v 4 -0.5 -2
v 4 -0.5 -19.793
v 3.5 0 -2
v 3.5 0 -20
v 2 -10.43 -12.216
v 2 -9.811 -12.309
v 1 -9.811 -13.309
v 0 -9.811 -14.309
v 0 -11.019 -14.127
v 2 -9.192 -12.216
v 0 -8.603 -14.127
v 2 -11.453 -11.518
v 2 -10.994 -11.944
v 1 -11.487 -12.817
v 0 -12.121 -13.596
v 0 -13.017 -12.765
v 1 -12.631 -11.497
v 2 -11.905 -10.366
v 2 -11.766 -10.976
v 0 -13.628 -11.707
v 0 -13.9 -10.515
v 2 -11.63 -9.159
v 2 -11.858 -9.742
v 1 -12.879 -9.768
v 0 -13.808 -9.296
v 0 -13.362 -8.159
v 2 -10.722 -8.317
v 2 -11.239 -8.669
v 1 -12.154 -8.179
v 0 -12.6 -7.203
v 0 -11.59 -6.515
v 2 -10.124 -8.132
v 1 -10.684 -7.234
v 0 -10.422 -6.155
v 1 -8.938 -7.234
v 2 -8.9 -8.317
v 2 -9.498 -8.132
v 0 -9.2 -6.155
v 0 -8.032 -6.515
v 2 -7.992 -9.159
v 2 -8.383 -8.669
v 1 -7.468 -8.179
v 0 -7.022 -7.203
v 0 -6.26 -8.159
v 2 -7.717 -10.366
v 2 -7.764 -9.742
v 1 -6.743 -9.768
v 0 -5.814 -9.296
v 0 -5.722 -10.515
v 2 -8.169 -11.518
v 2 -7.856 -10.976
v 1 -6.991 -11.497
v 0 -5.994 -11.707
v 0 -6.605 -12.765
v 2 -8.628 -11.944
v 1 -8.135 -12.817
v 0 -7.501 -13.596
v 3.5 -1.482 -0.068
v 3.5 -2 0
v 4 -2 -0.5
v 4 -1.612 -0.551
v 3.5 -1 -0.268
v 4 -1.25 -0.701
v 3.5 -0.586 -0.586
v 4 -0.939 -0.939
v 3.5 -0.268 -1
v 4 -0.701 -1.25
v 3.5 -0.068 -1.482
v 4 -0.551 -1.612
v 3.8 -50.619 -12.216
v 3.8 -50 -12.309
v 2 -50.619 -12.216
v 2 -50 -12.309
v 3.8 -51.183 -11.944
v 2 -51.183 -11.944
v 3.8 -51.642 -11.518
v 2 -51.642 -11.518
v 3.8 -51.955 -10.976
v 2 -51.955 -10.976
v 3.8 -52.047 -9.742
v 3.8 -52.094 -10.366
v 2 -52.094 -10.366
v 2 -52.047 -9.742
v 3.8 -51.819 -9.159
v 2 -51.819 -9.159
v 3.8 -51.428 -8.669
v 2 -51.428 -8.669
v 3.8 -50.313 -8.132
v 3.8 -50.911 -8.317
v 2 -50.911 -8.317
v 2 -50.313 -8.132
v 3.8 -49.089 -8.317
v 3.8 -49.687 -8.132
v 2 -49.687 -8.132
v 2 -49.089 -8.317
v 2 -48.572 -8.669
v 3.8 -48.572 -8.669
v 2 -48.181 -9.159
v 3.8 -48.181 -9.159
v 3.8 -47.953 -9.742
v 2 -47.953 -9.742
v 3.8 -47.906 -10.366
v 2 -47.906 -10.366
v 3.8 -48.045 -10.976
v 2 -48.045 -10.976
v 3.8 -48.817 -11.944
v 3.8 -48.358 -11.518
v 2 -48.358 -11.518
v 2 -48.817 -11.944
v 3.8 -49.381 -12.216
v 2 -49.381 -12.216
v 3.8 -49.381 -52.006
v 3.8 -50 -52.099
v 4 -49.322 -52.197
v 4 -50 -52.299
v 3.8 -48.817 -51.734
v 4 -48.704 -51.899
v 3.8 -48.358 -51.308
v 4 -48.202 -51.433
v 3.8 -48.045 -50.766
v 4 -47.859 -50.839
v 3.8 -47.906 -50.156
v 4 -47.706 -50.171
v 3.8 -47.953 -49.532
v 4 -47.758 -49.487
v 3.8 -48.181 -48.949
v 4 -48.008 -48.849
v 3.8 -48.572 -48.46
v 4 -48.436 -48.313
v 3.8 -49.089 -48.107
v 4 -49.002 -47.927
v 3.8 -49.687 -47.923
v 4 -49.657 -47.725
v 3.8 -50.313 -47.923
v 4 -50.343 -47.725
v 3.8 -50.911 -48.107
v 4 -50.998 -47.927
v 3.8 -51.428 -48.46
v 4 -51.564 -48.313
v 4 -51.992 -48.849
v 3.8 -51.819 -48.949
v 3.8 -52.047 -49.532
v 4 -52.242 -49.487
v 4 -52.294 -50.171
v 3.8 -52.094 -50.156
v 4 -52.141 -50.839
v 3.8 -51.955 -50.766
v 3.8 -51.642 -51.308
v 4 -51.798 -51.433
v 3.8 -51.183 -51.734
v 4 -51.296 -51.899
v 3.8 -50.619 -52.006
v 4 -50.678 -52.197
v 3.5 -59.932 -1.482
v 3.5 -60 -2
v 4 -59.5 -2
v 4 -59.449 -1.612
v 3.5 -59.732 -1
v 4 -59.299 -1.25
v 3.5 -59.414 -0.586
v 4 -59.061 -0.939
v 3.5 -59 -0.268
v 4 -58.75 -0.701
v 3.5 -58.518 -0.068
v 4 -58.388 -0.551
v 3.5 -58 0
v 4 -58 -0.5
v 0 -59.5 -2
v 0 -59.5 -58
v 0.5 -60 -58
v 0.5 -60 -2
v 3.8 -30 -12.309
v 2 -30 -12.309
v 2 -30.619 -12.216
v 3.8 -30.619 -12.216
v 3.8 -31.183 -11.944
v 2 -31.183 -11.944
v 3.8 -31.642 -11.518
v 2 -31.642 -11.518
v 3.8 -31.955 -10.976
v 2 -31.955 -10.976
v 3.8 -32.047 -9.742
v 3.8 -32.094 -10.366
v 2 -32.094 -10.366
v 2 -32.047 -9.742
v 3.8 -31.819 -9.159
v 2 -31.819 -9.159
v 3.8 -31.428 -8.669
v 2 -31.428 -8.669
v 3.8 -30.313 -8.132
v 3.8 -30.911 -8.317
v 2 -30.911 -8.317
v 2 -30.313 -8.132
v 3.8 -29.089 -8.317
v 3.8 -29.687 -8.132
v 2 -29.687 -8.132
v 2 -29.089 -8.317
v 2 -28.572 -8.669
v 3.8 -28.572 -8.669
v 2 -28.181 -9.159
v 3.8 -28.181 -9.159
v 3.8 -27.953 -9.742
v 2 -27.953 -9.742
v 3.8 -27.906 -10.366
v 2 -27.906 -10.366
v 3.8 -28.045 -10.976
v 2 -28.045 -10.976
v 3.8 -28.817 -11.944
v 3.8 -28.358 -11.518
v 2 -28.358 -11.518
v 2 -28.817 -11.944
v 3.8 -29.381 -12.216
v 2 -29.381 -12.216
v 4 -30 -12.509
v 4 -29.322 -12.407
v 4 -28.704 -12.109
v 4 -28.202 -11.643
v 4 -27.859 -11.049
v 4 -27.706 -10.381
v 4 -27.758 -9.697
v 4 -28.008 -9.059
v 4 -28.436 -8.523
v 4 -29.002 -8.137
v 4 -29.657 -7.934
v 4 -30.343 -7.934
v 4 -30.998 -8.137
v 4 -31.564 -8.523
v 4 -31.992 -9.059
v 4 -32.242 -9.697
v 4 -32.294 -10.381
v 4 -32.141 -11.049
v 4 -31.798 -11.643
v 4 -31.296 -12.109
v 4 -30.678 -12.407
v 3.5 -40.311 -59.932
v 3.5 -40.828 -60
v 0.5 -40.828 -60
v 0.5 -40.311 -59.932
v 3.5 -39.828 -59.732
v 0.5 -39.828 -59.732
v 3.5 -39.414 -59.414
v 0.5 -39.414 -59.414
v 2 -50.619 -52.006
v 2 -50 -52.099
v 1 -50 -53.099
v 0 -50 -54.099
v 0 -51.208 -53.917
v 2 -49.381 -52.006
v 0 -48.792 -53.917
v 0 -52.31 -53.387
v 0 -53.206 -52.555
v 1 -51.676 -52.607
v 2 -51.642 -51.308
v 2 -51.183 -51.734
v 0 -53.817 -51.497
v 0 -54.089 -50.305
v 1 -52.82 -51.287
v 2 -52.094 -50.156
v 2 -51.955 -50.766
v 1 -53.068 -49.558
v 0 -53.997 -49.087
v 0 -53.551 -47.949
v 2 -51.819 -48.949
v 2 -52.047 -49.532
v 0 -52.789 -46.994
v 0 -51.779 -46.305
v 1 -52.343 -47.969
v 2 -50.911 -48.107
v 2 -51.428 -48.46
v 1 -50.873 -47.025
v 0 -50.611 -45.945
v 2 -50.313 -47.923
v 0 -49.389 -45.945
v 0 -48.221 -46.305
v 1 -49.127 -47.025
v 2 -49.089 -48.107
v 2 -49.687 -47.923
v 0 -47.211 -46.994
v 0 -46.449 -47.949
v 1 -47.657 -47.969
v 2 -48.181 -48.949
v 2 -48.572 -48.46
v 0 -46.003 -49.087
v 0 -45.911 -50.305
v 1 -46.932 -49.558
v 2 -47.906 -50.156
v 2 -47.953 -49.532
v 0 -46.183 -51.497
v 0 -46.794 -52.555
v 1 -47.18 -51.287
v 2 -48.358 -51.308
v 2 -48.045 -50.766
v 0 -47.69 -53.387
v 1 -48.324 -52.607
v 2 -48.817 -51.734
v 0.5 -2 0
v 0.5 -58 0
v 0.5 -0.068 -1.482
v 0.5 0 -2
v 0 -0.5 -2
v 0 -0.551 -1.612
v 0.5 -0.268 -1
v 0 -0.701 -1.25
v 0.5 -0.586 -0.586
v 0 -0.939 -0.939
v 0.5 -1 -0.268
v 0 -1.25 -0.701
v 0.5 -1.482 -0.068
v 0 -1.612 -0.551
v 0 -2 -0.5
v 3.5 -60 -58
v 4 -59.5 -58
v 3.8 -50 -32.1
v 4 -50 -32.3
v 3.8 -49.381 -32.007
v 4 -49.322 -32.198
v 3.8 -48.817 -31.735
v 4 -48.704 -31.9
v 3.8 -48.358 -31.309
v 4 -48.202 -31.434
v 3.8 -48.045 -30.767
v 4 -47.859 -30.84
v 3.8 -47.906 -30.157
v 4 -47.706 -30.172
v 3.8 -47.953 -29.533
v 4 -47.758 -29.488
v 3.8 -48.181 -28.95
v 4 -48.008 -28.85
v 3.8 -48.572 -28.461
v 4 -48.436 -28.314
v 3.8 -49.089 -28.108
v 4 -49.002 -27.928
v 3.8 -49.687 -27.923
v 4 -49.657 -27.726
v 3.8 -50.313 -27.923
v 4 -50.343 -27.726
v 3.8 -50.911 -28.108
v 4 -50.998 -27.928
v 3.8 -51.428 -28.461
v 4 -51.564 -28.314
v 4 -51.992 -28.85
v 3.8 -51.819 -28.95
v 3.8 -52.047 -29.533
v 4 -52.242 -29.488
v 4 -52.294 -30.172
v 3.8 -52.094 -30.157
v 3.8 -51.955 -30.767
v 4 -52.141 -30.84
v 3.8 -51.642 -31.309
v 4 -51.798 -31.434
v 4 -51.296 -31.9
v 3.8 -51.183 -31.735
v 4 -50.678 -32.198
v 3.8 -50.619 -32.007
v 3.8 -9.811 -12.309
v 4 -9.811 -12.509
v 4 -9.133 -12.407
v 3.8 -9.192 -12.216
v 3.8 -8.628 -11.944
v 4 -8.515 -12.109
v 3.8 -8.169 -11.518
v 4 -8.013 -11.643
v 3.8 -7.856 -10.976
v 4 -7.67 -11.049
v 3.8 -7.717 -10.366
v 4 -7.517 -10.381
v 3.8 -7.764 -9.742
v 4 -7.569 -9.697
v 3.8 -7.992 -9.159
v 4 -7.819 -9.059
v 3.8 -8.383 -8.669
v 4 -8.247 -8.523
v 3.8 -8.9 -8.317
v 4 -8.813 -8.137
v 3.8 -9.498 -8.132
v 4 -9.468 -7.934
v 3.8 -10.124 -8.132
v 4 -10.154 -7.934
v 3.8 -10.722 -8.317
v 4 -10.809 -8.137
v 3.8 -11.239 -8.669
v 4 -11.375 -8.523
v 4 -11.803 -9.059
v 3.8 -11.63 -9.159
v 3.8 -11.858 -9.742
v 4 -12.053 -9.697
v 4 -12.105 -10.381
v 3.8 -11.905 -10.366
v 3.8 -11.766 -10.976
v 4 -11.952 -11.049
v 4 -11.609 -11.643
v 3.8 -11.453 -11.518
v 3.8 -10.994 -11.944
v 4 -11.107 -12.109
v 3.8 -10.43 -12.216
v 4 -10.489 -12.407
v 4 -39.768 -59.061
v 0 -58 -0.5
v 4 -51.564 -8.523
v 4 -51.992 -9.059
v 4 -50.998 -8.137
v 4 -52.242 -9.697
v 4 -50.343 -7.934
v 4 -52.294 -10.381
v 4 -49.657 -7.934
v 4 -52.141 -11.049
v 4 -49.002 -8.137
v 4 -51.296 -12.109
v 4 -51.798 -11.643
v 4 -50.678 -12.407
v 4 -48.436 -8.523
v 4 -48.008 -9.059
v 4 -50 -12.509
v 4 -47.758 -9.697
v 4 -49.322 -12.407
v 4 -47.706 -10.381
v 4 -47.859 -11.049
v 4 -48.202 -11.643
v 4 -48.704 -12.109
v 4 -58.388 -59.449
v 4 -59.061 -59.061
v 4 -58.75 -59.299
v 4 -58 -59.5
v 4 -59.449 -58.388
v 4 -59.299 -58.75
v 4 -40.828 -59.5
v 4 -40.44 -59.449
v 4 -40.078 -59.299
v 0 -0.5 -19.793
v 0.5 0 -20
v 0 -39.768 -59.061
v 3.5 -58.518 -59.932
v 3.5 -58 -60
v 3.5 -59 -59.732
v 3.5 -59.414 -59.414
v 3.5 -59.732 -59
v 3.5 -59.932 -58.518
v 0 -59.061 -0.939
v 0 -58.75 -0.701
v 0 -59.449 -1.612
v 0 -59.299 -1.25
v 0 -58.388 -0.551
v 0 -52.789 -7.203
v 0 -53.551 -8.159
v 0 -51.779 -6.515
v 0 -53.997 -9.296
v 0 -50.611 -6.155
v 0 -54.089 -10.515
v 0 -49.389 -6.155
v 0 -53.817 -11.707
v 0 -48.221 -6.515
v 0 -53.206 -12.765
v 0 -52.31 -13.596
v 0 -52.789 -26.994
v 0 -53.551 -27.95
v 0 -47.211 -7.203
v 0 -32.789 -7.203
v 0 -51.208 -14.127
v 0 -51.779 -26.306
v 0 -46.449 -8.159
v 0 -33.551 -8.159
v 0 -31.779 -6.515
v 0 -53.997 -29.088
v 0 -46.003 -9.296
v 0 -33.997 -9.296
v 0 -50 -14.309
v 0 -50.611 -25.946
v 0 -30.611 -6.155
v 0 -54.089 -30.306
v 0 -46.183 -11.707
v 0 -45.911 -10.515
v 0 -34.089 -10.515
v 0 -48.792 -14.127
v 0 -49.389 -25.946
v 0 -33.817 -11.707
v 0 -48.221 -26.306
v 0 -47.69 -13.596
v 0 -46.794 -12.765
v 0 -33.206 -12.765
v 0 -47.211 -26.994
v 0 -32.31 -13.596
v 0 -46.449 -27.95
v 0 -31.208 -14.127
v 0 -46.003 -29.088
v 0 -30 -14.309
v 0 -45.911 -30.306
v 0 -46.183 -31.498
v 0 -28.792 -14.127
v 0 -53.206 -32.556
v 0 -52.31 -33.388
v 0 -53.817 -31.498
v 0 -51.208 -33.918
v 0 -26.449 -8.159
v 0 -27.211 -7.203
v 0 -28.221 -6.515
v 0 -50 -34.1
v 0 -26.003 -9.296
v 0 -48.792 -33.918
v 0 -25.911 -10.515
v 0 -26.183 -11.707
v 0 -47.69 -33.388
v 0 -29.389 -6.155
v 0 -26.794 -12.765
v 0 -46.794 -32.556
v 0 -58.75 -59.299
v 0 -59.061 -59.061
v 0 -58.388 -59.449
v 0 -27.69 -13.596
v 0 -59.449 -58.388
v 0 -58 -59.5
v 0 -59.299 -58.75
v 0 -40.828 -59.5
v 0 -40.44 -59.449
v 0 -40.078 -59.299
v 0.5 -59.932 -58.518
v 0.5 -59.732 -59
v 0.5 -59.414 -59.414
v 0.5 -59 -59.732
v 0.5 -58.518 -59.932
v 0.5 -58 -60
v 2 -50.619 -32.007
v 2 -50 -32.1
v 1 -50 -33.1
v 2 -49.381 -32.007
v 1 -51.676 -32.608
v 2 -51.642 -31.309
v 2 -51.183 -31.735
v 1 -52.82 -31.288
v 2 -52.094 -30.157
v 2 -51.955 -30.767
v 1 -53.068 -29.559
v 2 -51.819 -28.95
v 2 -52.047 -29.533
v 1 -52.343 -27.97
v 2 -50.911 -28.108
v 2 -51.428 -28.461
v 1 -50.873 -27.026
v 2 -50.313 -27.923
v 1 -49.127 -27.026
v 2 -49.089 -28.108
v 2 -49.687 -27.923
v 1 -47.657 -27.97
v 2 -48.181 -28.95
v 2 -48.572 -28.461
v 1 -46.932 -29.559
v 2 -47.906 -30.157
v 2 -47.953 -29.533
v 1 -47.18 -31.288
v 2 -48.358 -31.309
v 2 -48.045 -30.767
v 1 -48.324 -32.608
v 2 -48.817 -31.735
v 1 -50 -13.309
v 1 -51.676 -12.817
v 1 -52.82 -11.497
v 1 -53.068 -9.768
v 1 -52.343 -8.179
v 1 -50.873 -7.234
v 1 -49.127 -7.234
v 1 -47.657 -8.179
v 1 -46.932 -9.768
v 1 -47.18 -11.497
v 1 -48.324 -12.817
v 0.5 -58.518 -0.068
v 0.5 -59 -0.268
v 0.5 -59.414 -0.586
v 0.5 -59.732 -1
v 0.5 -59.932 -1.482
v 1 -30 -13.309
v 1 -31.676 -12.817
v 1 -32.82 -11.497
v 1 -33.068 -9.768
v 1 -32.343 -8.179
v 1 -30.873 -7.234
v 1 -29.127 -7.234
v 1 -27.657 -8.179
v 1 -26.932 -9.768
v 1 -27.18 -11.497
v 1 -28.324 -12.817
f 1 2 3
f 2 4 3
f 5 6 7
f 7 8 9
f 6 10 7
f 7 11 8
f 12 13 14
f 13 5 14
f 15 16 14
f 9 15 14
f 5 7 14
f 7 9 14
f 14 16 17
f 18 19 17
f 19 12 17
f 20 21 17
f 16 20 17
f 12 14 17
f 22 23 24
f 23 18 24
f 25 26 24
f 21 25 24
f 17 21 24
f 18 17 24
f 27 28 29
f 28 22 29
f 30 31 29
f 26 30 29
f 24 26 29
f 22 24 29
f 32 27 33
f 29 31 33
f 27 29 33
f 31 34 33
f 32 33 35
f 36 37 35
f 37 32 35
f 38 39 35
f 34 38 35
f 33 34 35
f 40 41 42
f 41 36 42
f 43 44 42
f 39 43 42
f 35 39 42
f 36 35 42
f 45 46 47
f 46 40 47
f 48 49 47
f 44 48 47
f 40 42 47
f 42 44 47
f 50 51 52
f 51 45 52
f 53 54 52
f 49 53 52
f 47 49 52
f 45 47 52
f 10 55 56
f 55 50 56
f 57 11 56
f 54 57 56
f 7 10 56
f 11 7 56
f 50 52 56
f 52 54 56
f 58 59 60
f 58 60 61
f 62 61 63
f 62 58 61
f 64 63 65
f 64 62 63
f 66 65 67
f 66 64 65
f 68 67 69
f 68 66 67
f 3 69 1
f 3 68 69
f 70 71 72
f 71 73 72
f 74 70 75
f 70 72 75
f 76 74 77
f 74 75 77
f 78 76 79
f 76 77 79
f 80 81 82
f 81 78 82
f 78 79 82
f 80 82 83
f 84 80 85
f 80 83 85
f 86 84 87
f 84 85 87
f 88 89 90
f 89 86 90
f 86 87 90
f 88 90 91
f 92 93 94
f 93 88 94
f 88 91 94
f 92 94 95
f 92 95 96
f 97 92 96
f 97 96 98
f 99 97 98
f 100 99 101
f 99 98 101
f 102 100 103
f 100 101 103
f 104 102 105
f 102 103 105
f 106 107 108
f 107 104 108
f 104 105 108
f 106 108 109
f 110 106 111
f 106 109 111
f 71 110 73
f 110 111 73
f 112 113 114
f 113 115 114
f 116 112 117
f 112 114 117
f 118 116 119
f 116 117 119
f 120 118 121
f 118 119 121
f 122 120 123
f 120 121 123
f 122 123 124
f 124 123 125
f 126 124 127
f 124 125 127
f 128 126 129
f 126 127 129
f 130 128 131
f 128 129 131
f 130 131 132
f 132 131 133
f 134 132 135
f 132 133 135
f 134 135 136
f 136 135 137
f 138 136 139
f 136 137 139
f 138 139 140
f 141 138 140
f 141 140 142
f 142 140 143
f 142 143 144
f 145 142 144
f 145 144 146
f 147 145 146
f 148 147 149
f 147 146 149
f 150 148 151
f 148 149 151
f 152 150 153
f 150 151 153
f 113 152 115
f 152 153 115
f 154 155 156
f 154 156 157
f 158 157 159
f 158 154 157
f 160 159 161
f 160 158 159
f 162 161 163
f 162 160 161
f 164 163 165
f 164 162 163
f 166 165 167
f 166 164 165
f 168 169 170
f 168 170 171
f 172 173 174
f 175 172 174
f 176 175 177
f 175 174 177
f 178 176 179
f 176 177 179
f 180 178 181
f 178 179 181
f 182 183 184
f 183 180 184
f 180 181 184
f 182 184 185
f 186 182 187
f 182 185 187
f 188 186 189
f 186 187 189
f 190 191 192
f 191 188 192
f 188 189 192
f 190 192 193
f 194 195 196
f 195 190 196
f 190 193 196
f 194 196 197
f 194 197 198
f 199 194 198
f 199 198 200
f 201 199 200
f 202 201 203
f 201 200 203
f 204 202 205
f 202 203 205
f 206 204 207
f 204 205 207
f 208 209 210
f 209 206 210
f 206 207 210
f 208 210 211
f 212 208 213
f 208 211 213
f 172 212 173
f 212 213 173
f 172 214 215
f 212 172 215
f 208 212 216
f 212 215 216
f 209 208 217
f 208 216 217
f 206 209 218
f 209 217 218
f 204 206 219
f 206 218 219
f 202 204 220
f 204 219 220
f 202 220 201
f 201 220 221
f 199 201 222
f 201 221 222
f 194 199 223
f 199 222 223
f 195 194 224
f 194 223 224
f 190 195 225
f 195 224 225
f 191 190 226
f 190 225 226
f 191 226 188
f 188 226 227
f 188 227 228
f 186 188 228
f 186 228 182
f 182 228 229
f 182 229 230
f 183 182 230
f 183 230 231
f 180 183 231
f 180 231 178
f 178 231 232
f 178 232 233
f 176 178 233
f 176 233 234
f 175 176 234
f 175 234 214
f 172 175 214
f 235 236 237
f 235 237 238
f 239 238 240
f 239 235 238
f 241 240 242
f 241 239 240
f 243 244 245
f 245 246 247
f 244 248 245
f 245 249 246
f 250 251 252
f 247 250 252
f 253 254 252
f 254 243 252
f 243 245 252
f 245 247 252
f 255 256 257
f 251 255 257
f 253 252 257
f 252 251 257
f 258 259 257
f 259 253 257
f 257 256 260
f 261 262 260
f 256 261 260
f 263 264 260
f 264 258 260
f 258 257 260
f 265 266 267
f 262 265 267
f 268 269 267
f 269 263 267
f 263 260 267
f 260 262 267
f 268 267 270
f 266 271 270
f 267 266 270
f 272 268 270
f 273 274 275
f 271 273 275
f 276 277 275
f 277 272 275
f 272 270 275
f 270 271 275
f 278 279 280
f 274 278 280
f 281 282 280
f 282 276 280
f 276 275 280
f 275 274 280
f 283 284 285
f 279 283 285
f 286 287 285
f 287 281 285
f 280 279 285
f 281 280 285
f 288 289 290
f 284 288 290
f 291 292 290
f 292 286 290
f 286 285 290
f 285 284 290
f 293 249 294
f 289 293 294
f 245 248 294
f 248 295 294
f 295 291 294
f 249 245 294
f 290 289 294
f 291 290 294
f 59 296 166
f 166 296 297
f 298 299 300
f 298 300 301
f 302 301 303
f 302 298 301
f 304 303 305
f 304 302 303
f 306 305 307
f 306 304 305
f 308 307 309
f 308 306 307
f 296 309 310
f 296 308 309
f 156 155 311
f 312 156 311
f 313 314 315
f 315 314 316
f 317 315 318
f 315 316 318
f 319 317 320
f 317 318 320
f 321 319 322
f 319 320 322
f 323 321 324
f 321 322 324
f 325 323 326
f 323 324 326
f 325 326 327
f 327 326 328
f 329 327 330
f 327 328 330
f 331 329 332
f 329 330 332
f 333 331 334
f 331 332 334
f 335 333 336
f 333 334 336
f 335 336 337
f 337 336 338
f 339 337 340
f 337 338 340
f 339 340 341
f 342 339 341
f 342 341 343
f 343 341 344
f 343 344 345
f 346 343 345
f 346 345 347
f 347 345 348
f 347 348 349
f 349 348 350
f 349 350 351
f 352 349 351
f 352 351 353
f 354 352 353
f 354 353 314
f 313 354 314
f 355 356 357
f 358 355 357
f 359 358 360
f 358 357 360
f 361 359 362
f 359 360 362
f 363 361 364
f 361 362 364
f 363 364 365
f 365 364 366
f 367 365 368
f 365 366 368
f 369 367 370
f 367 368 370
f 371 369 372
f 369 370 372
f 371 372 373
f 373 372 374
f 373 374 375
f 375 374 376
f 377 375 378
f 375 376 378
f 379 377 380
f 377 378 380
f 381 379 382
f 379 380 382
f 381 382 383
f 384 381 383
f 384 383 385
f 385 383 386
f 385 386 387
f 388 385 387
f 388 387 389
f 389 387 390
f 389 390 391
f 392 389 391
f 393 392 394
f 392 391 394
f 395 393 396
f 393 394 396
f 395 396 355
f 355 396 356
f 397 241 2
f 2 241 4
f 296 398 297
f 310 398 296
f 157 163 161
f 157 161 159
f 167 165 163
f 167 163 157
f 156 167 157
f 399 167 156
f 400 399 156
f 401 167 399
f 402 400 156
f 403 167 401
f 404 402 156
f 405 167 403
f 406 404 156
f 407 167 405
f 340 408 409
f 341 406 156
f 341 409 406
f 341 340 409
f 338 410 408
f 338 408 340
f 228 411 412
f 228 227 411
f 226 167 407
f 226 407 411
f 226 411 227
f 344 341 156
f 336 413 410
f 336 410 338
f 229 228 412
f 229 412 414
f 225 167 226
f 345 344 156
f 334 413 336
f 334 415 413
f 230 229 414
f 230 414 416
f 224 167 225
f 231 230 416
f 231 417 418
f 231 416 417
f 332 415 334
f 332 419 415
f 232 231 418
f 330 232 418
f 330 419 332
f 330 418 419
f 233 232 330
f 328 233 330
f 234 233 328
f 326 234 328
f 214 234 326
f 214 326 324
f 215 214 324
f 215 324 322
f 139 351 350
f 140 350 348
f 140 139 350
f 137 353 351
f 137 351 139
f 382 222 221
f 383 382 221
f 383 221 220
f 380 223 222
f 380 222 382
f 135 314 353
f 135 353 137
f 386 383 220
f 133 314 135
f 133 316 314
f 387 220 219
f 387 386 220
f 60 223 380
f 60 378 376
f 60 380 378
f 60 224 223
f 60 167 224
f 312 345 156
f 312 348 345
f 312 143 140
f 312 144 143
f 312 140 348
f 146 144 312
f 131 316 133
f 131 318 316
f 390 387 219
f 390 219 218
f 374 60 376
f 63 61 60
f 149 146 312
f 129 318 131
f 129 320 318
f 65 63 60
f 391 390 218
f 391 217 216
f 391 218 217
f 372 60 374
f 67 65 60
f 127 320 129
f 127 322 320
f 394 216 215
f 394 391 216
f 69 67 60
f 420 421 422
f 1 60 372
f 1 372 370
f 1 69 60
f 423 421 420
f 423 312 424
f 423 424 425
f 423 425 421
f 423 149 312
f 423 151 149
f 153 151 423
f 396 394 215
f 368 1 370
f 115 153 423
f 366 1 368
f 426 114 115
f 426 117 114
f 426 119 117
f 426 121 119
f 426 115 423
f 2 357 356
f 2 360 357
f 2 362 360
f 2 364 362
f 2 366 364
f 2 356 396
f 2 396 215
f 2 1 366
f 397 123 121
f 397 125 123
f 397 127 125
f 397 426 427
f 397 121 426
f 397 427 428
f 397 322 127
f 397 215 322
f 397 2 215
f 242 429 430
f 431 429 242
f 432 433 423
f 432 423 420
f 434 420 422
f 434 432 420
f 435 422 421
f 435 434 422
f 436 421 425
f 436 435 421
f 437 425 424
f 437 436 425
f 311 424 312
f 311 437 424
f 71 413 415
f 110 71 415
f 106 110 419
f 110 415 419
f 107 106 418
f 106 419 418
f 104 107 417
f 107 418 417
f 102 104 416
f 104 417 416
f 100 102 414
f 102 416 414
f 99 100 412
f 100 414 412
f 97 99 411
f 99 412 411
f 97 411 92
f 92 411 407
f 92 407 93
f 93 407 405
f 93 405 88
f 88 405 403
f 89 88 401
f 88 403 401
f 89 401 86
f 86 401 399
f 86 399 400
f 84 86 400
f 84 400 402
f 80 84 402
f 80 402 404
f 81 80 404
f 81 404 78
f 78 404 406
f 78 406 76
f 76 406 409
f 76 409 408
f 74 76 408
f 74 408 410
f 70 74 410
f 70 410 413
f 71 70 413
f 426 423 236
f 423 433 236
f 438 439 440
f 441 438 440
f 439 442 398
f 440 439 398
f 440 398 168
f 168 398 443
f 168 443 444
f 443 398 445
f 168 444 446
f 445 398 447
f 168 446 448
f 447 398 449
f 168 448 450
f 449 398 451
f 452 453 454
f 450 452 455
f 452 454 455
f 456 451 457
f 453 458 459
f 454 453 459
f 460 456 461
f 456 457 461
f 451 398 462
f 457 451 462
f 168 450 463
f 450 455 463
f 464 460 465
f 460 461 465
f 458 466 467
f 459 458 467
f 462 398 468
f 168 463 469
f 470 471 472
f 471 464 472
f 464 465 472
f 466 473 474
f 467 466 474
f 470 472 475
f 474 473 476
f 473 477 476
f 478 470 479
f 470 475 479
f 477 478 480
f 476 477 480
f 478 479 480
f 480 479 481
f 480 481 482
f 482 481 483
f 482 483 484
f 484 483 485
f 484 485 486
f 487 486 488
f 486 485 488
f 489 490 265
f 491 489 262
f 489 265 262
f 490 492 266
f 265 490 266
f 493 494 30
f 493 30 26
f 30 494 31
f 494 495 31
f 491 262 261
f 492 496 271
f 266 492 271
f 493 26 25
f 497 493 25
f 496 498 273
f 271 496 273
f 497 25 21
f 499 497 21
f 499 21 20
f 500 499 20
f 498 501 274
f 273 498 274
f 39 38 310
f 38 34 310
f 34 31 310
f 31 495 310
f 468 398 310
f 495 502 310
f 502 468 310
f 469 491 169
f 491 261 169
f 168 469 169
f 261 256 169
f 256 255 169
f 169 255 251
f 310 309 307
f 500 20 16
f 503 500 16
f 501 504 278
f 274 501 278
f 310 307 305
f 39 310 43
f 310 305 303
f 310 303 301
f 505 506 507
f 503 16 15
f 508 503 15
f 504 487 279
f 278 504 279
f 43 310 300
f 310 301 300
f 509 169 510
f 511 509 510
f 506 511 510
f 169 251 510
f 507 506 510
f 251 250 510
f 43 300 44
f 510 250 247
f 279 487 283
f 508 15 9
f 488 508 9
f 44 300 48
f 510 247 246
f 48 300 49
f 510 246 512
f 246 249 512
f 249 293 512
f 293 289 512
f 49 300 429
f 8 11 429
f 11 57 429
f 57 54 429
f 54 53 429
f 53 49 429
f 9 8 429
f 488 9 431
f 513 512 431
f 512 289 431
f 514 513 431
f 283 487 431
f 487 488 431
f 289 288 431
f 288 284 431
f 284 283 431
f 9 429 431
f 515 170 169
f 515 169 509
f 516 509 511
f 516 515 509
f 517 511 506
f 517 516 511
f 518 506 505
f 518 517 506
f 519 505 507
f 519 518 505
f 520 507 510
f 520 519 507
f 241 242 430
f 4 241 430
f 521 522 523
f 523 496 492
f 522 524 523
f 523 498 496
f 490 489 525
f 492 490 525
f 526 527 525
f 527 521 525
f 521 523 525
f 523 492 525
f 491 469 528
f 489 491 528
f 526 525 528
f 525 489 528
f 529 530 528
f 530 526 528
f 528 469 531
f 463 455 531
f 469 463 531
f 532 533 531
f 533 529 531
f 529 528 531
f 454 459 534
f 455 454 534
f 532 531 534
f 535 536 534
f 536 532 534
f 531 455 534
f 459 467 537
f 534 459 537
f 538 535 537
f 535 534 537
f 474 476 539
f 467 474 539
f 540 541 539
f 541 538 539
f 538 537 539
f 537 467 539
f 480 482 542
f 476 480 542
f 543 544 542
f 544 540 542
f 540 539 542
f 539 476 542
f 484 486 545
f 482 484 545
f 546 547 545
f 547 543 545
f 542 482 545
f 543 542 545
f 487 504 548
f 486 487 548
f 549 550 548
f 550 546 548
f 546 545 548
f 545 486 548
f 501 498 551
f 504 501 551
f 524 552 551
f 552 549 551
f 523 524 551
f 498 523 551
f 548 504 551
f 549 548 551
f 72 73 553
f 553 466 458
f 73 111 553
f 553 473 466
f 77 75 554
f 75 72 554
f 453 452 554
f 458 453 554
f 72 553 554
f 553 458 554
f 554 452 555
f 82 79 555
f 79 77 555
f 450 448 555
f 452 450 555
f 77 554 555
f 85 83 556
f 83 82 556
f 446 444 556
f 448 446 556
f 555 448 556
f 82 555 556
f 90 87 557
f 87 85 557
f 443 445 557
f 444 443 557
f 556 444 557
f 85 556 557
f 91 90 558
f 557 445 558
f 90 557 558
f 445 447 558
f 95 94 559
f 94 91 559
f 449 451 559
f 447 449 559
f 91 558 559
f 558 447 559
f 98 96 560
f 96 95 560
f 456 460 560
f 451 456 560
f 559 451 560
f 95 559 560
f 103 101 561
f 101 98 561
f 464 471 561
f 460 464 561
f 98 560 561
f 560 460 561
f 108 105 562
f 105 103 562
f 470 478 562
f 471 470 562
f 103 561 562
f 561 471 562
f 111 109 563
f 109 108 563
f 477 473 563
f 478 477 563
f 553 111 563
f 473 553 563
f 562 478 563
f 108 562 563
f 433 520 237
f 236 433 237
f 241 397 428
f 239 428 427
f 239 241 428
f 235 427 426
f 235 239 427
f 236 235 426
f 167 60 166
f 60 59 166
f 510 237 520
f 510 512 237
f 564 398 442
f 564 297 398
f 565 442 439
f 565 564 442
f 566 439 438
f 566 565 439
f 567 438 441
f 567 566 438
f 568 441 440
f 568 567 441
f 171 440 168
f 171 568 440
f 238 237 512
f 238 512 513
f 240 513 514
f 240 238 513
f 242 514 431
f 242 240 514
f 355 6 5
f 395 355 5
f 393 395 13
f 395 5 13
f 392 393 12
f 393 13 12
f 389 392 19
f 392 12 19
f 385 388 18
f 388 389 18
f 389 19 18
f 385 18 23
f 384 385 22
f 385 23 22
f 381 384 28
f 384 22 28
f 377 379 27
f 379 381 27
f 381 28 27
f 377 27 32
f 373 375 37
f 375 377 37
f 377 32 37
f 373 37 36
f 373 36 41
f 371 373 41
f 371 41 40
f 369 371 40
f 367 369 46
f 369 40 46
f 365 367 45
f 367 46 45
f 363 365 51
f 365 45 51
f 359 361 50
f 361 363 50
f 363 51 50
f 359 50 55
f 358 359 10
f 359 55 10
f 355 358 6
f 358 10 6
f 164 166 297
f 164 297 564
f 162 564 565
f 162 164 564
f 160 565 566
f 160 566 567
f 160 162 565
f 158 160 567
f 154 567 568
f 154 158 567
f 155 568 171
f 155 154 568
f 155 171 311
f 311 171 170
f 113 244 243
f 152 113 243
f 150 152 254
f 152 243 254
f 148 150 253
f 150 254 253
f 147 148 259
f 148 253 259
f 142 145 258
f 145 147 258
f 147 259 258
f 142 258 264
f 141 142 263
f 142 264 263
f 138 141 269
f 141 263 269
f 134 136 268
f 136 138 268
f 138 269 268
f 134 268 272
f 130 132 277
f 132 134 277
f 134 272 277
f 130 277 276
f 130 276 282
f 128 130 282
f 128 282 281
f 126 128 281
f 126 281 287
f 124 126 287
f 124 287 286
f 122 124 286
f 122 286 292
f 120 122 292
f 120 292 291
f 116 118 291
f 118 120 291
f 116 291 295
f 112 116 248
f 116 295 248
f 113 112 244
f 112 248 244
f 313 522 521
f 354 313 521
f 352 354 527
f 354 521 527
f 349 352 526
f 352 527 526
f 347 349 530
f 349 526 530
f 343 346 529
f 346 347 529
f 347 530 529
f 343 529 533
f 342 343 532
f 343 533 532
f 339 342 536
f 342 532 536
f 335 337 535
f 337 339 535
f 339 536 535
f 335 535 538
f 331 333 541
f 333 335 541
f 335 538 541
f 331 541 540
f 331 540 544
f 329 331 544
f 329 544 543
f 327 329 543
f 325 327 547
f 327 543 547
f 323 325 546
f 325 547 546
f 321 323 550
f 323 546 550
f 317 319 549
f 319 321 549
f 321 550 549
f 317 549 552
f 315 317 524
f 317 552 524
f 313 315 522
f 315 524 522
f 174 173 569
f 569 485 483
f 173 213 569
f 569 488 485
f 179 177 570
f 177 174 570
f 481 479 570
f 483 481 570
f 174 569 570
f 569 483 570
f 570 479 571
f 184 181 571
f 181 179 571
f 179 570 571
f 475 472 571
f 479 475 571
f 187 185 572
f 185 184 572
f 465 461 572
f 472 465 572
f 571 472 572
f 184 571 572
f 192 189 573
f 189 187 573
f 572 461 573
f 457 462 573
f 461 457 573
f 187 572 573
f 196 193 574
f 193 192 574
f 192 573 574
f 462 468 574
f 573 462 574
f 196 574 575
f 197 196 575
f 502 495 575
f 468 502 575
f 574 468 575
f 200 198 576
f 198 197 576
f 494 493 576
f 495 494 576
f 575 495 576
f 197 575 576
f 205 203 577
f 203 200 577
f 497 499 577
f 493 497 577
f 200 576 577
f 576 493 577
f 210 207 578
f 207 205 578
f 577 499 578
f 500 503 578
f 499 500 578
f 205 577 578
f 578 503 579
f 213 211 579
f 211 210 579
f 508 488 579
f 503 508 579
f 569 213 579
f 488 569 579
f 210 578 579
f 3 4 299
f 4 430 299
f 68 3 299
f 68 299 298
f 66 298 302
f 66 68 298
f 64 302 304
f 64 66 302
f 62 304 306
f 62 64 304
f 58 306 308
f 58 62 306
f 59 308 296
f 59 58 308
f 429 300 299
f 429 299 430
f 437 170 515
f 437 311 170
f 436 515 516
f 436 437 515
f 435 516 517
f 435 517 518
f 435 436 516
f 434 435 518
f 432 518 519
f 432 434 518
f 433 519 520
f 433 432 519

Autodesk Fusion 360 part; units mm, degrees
sketch "Sketch1" plane through (0, 0, 0) normal (1, 0, 0) x (0, 0, -1)
  line L0 (0, 0) -> (0, -60)
  line L1 (0, -60) -> (60, -60)
  line L2 (60, -60) -> (60, -40)
  line L3 (20, 0) -> (0, 0)
  line L4 (60, -40) -> (40, -20)
  line L5 (60, -50) -> (0, -50) construction
  line L6 (10.2088, 0) -> (10.2088, -60) construction
  line L7 (0, -9.7462) -> (40, -10) construction
  line L8 (0, -30) -> (50, -30) construction
  line L9 (49.9986, -60) -> (50, -30) construction
  line L10 (30, -60) -> (30, 0) construction
  circle A0 centre (10.2088, -9.811) radius 2.1
  circle A1 centre (10.2088, -30) radius 2.1
  circle A2 centre (10.2088, -50) radius 2.1
  circle A3 centre (30, -50) radius 2.1
  circle A4 centre (49.9991, -50) radius 2.1
  line L11 (60, -40) -> (20, 0)
  dimension "d1" = 60
  dimension "d2" = 60
  dimension "d3" = 20
  dimension "d15" = 4.2
  dimension "d16" = 4.2
  dimension "d17" = 4.2
  dimension "d18" = 4.2
  dimension "d19" = 4.2
extrude "Extrude1" add sketch "Sketch1" along normal blind 4
chamfer "Chamfer1" distance 2 angle 45 5 edges at (0, -9.0516, -8.2509) (0, -29.2406, -8.2509) (0, -49.2406, -8.2509) (0, -49.2406, -28.0421) (0, -49.2406, -48.0412)
fillet "Fillet1" radius 2 4 edges at (2, -60, -60) (2, -60, 0) (2, -40, -60) (2, 0, 0)
chamfer "Chamfer2" distance 0.5 angle 45 17 edges at (0, -60, -30) (0, -59.4142, -59.4142) (0, -49.4142, -60) (0, -40.0631, -59.8478) (0, -19.7071, -39.7071) (0, 0, -11) (0, -0.5858, -0.5858) (0, -30, 0) (4, -19.7071, -39.7071) (4, -40.0631, -59.8478) (4, -49.4142, -60) (4, -59.4142, -59.4142) (4, -60, -30) (4, -59.4142, -0.5858) (4, -30, 0) (4, -0.5858, -0.5858) (4, 0, -11)
chamfer "Chamfer3" distance 0.2 angle 45 5 edges at (4, -9.0516, -8.2509) (4, -29.2406, -8.2509) (4, -49.2406, -8.2509) (4, -49.2406, -28.0421) (4, -49.2406, -48.0412)
